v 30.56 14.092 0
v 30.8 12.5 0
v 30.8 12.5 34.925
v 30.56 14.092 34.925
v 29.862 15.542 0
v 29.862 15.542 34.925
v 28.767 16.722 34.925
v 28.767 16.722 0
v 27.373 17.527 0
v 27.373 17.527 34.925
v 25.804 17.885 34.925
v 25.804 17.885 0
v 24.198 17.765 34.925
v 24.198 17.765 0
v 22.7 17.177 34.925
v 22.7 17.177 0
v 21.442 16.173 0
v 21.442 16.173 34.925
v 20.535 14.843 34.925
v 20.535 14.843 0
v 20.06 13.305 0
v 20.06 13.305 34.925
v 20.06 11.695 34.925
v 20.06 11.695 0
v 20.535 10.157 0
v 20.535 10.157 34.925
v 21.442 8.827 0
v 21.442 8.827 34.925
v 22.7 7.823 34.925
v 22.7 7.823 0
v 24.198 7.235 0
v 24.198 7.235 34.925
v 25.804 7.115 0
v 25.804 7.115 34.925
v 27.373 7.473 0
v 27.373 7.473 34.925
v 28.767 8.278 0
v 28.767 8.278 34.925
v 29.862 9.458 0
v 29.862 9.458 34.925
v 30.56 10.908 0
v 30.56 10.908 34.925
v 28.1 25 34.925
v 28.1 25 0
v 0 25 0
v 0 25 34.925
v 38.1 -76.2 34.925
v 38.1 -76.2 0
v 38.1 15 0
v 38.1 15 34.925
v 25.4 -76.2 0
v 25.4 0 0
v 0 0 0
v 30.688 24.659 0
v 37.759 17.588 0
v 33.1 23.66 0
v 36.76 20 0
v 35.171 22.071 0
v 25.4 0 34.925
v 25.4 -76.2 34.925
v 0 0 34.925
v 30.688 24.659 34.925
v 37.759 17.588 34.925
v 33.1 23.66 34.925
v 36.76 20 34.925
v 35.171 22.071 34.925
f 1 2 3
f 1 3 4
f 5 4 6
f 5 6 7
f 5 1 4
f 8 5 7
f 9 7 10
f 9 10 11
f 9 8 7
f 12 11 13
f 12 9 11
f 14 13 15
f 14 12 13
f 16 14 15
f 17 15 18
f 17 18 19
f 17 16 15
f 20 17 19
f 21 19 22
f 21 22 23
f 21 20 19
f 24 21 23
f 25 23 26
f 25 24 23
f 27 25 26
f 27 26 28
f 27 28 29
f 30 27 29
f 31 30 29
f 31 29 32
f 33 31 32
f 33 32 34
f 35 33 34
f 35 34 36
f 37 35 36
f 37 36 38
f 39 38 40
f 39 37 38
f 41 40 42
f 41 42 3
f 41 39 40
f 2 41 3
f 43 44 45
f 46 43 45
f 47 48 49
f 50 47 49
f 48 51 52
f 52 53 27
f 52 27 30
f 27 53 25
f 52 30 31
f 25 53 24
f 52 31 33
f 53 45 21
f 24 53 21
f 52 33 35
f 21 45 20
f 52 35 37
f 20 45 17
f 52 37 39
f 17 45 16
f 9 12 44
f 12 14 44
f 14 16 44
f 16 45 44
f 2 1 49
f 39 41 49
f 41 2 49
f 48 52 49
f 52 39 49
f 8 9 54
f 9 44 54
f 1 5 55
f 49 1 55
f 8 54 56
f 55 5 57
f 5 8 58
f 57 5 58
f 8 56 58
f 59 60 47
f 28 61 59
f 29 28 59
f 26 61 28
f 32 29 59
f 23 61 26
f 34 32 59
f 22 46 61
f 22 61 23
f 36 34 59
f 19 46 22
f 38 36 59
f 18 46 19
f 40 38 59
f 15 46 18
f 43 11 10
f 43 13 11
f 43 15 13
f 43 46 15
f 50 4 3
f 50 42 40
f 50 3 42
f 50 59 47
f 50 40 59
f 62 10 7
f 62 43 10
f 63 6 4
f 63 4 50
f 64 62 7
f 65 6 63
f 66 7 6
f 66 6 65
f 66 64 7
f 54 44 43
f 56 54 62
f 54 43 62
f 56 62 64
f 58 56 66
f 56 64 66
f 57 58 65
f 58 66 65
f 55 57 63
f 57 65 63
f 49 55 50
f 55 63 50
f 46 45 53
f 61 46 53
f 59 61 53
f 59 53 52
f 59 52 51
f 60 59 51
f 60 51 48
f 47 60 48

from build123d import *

# Parameters (mm, degrees)
SKETCH1_R           = 5.4
BOSS_EXTRUDE1_DEPTH = 34.925
FILLET1_R           = 10


with BuildPart() as part:
    # Sketch1 → Boss-Extrude1 (new body)
    with BuildSketch(Plane.XY):
        Polygon((0, 0), (25.4, 0), (25.4, -76.2), (38.1, -76.2), (38.1, 25), (0, 25), align=None)
        with Locations((25.4, 12.5)):
            Circle(SKETCH1_R, mode=Mode.SUBTRACT)
    extrude(amount=BOSS_EXTRUDE1_DEPTH)

    # Fillet1
    fillet1_edges = [part.edges().sort_by_distance(p)[0] for p in [
        (38.1, 25, 17.4625),
    ]]
    fillet(fillet1_edges, radius=FILLET1_R)


solid = part.part
